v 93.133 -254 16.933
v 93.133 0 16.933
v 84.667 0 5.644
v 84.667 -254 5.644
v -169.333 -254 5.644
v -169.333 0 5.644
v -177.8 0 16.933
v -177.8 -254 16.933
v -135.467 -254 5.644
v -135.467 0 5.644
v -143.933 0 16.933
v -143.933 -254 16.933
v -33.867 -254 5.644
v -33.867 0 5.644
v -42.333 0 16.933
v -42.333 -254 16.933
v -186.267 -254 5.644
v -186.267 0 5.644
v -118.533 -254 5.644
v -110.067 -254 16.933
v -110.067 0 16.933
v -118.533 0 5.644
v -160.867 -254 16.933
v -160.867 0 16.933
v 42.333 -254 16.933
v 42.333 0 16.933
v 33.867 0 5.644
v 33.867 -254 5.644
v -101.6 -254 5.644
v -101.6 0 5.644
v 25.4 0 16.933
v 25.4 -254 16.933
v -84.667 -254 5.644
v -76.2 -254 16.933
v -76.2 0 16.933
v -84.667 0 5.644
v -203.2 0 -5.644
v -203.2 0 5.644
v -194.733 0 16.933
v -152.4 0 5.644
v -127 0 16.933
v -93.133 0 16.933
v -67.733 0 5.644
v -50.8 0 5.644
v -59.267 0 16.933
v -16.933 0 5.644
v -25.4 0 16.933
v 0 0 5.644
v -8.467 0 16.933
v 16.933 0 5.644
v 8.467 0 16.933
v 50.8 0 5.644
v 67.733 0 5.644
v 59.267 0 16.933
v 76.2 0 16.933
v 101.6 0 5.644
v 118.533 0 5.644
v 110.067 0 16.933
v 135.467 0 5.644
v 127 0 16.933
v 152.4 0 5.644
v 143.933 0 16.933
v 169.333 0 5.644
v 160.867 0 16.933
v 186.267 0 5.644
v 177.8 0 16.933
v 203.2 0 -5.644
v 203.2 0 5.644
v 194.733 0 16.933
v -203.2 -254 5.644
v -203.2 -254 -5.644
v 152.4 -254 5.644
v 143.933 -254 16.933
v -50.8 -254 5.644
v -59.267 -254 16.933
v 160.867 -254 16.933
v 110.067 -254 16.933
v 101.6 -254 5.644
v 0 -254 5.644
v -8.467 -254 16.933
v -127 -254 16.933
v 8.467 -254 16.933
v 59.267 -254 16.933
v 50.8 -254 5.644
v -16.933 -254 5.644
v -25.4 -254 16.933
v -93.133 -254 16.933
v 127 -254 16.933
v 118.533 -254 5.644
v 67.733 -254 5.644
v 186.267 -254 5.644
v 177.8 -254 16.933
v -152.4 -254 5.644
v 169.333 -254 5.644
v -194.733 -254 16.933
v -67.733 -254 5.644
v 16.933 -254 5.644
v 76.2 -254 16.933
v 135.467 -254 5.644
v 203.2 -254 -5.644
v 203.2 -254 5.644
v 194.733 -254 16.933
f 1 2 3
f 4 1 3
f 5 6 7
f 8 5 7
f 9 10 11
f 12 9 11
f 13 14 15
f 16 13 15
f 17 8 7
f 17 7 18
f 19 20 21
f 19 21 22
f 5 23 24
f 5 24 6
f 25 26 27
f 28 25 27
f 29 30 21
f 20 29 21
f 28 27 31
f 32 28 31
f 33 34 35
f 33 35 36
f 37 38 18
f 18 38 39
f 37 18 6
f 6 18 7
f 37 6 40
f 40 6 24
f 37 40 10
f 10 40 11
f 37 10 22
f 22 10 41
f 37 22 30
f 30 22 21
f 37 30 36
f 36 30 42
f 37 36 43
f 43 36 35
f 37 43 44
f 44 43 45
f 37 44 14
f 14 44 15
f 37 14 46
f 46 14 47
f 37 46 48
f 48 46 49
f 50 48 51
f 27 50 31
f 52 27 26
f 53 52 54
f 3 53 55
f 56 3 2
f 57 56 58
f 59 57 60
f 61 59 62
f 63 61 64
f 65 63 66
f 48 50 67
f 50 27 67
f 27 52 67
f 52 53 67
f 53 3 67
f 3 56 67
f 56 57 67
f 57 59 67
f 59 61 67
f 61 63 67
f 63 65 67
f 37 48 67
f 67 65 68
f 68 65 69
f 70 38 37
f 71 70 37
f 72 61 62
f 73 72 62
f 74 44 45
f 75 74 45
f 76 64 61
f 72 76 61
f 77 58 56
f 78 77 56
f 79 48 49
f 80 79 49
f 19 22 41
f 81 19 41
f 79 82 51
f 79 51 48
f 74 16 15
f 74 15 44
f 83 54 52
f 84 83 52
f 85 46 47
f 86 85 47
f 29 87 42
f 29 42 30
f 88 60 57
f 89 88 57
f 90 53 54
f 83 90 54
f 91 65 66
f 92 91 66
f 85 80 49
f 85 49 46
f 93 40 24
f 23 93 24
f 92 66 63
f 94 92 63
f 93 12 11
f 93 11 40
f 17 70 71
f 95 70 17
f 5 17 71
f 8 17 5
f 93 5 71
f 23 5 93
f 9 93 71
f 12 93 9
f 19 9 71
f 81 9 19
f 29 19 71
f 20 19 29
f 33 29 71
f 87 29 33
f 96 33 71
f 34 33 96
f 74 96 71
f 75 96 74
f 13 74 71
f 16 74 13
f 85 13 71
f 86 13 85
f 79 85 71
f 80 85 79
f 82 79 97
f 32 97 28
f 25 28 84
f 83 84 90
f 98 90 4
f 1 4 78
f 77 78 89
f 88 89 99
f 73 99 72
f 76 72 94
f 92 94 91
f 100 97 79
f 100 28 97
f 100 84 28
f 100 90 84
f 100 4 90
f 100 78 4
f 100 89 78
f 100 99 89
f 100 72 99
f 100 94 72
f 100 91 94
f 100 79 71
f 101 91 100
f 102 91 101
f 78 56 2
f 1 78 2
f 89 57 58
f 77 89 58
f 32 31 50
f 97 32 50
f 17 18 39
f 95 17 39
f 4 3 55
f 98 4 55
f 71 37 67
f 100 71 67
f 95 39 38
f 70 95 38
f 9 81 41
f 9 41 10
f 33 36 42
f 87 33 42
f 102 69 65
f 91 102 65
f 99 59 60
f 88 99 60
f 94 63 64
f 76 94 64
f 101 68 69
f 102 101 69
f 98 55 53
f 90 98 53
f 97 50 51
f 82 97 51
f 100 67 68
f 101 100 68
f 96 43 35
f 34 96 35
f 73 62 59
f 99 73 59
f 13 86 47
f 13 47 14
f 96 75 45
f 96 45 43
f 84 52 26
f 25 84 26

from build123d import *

# Parameters (mm, degrees)
F1_DEPTH = 254


# Not quite as in the source:
# - ends of sketch curves that miss each other by under 0.0002 mm in the source are joined


with BuildPart() as f1:
    # F0 (on Front) → F1 (new body)
    with BuildSketch(Plane.XZ):
        Polygon((-194.73333335, 16.9333332013), (-203.2, 5.6444444388), (-194.73333335, 5.6444444388), align=None)
        Polygon((-194.73333335, 5.6444444388), (-203.2, 5.6444444388), (-203.2, -5.6444444388), (203.2, -5.6444444388), (203.2, 5.6444444388), (186.26665915, 5.6444444388), (169.33332615, 5.6444444388), (152.39999315, 5.6444444388), (135.46666015, 5.6444444388), (118.53332715, 5.6444444388), (101.59999415, 5.6444444388), (84.66666115, 5.6444444388), (67.73332815, 5.6444444388), (50.79999515, 5.6444444388), (33.86666215, 5.6444444388), (16.93332915, 5.6444444388), (-3.85e-06, 5.6444444388), (-16.93333685, 5.6444444388), (-33.86666985, 5.6444444388), (-50.80000285, 5.6444444388), (-67.73333585, 5.6444444388), (-84.66666885, 5.6444444388), (-101.60000185, 5.6444444388), (-118.53333485, 5.6444444388), (-135.46666785, 5.6444444388), (-152.40000085, 5.6444444388), (-169.33333385, 5.6444444388), (-186.26666685, 5.6444444388), align=None)
        Polygon((-194.73333335, 16.9333332013), (-194.73333335, 5.6444444388), (-186.26666685, 5.6444444388), align=None)
        Polygon((-177.80000035, 16.9333332013), (-186.266667, 5.6444444388), (-169.33333385, 5.6444444388), align=None)
        Polygon((-160.86666735, 16.9333332013), (-169.333334, 5.6444444388), (-152.40000085, 5.6444444388), align=None)
        Polygon((186.26665915, 5.6444444388), (203.2, 5.6444444388), (194.73332565, 16.9333332013), align=None)
        Polygon((-143.93333435, 16.9333332013), (-152.400001, 5.6444444388), (-135.46666785, 5.6444444388), align=None)
        Polygon((169.33332615, 5.6444444388), (186.26665915, 5.6444444388), (177.79999265, 16.9333332013), align=None)
        Polygon((-127.00000135, 16.9333332013), (-135.466668, 5.6444444388), (-118.53333485, 5.6444444388), align=None)
        Polygon((152.39999315, 5.6444444388), (169.33332615, 5.6444444388), (160.86665965, 16.9333332013), align=None)
        Polygon((-110.06666835, 16.9333332013), (-118.533335, 5.6444444388), (-101.60000185, 5.6444444388), align=None)
        Polygon((135.46666015, 5.6444444388), (152.39999315, 5.6444444388), (143.93332665, 16.9333332013), align=None)
        Polygon((-93.13333535, 16.9333332013), (-101.600002, 5.6444444388), (-84.66666885, 5.6444444388), align=None)
        Polygon((118.53332715, 5.6444444388), (135.46666015, 5.6444444388), (126.99999365, 16.9333332013), align=None)
        Polygon((-76.20000235, 16.9333332013), (-84.666669, 5.6444444388), (-67.73333585, 5.6444444388), align=None)
        Polygon((101.59999415, 5.6444444388), (118.53332715, 5.6444444388), (110.06666065, 16.9333332013), align=None)
        Polygon((-59.26666935, 16.9333332013), (-67.733336, 5.6444444388), (-50.80000285, 5.6444444388), align=None)
        Polygon((84.66666115, 5.6444444388), (101.59999415, 5.6444444388), (93.13332765, 16.9333332013), align=None)
        Polygon((-42.33333635, 16.9333332013), (-50.800003, 5.6444444388), (-33.86666985, 5.6444444388), align=None)
        Polygon((67.73332815, 5.6444444388), (84.66666115, 5.6444444388), (76.19999465, 16.9333332013), align=None)
        Polygon((-25.40000335, 16.9333332013), (-33.86667, 5.6444444388), (-16.93333685, 5.6444444388), align=None)
        Polygon((50.79999515, 5.6444444388), (67.73332815, 5.6444444388), (59.26666165, 16.9333332013), align=None)
        Polygon((-8.46667035, 16.9333332013), (-16.933337, 5.6444444388), (-3.85e-06, 5.6444444388), align=None)
        Polygon((33.86666215, 5.6444444388), (50.79999515, 5.6444444388), (42.33332865, 16.9333332013), align=None)
        Polygon((8.46666265, 16.9333332013), (-4e-06, 5.6444444388), (16.93332915, 5.6444444388), align=None)
        Polygon((16.93332915, 5.6444444388), (33.86666215, 5.6444444388), (25.39999565, 16.9333332013), align=None)
    extrude(amount=F1_DEPTH)


solid = f1.part
